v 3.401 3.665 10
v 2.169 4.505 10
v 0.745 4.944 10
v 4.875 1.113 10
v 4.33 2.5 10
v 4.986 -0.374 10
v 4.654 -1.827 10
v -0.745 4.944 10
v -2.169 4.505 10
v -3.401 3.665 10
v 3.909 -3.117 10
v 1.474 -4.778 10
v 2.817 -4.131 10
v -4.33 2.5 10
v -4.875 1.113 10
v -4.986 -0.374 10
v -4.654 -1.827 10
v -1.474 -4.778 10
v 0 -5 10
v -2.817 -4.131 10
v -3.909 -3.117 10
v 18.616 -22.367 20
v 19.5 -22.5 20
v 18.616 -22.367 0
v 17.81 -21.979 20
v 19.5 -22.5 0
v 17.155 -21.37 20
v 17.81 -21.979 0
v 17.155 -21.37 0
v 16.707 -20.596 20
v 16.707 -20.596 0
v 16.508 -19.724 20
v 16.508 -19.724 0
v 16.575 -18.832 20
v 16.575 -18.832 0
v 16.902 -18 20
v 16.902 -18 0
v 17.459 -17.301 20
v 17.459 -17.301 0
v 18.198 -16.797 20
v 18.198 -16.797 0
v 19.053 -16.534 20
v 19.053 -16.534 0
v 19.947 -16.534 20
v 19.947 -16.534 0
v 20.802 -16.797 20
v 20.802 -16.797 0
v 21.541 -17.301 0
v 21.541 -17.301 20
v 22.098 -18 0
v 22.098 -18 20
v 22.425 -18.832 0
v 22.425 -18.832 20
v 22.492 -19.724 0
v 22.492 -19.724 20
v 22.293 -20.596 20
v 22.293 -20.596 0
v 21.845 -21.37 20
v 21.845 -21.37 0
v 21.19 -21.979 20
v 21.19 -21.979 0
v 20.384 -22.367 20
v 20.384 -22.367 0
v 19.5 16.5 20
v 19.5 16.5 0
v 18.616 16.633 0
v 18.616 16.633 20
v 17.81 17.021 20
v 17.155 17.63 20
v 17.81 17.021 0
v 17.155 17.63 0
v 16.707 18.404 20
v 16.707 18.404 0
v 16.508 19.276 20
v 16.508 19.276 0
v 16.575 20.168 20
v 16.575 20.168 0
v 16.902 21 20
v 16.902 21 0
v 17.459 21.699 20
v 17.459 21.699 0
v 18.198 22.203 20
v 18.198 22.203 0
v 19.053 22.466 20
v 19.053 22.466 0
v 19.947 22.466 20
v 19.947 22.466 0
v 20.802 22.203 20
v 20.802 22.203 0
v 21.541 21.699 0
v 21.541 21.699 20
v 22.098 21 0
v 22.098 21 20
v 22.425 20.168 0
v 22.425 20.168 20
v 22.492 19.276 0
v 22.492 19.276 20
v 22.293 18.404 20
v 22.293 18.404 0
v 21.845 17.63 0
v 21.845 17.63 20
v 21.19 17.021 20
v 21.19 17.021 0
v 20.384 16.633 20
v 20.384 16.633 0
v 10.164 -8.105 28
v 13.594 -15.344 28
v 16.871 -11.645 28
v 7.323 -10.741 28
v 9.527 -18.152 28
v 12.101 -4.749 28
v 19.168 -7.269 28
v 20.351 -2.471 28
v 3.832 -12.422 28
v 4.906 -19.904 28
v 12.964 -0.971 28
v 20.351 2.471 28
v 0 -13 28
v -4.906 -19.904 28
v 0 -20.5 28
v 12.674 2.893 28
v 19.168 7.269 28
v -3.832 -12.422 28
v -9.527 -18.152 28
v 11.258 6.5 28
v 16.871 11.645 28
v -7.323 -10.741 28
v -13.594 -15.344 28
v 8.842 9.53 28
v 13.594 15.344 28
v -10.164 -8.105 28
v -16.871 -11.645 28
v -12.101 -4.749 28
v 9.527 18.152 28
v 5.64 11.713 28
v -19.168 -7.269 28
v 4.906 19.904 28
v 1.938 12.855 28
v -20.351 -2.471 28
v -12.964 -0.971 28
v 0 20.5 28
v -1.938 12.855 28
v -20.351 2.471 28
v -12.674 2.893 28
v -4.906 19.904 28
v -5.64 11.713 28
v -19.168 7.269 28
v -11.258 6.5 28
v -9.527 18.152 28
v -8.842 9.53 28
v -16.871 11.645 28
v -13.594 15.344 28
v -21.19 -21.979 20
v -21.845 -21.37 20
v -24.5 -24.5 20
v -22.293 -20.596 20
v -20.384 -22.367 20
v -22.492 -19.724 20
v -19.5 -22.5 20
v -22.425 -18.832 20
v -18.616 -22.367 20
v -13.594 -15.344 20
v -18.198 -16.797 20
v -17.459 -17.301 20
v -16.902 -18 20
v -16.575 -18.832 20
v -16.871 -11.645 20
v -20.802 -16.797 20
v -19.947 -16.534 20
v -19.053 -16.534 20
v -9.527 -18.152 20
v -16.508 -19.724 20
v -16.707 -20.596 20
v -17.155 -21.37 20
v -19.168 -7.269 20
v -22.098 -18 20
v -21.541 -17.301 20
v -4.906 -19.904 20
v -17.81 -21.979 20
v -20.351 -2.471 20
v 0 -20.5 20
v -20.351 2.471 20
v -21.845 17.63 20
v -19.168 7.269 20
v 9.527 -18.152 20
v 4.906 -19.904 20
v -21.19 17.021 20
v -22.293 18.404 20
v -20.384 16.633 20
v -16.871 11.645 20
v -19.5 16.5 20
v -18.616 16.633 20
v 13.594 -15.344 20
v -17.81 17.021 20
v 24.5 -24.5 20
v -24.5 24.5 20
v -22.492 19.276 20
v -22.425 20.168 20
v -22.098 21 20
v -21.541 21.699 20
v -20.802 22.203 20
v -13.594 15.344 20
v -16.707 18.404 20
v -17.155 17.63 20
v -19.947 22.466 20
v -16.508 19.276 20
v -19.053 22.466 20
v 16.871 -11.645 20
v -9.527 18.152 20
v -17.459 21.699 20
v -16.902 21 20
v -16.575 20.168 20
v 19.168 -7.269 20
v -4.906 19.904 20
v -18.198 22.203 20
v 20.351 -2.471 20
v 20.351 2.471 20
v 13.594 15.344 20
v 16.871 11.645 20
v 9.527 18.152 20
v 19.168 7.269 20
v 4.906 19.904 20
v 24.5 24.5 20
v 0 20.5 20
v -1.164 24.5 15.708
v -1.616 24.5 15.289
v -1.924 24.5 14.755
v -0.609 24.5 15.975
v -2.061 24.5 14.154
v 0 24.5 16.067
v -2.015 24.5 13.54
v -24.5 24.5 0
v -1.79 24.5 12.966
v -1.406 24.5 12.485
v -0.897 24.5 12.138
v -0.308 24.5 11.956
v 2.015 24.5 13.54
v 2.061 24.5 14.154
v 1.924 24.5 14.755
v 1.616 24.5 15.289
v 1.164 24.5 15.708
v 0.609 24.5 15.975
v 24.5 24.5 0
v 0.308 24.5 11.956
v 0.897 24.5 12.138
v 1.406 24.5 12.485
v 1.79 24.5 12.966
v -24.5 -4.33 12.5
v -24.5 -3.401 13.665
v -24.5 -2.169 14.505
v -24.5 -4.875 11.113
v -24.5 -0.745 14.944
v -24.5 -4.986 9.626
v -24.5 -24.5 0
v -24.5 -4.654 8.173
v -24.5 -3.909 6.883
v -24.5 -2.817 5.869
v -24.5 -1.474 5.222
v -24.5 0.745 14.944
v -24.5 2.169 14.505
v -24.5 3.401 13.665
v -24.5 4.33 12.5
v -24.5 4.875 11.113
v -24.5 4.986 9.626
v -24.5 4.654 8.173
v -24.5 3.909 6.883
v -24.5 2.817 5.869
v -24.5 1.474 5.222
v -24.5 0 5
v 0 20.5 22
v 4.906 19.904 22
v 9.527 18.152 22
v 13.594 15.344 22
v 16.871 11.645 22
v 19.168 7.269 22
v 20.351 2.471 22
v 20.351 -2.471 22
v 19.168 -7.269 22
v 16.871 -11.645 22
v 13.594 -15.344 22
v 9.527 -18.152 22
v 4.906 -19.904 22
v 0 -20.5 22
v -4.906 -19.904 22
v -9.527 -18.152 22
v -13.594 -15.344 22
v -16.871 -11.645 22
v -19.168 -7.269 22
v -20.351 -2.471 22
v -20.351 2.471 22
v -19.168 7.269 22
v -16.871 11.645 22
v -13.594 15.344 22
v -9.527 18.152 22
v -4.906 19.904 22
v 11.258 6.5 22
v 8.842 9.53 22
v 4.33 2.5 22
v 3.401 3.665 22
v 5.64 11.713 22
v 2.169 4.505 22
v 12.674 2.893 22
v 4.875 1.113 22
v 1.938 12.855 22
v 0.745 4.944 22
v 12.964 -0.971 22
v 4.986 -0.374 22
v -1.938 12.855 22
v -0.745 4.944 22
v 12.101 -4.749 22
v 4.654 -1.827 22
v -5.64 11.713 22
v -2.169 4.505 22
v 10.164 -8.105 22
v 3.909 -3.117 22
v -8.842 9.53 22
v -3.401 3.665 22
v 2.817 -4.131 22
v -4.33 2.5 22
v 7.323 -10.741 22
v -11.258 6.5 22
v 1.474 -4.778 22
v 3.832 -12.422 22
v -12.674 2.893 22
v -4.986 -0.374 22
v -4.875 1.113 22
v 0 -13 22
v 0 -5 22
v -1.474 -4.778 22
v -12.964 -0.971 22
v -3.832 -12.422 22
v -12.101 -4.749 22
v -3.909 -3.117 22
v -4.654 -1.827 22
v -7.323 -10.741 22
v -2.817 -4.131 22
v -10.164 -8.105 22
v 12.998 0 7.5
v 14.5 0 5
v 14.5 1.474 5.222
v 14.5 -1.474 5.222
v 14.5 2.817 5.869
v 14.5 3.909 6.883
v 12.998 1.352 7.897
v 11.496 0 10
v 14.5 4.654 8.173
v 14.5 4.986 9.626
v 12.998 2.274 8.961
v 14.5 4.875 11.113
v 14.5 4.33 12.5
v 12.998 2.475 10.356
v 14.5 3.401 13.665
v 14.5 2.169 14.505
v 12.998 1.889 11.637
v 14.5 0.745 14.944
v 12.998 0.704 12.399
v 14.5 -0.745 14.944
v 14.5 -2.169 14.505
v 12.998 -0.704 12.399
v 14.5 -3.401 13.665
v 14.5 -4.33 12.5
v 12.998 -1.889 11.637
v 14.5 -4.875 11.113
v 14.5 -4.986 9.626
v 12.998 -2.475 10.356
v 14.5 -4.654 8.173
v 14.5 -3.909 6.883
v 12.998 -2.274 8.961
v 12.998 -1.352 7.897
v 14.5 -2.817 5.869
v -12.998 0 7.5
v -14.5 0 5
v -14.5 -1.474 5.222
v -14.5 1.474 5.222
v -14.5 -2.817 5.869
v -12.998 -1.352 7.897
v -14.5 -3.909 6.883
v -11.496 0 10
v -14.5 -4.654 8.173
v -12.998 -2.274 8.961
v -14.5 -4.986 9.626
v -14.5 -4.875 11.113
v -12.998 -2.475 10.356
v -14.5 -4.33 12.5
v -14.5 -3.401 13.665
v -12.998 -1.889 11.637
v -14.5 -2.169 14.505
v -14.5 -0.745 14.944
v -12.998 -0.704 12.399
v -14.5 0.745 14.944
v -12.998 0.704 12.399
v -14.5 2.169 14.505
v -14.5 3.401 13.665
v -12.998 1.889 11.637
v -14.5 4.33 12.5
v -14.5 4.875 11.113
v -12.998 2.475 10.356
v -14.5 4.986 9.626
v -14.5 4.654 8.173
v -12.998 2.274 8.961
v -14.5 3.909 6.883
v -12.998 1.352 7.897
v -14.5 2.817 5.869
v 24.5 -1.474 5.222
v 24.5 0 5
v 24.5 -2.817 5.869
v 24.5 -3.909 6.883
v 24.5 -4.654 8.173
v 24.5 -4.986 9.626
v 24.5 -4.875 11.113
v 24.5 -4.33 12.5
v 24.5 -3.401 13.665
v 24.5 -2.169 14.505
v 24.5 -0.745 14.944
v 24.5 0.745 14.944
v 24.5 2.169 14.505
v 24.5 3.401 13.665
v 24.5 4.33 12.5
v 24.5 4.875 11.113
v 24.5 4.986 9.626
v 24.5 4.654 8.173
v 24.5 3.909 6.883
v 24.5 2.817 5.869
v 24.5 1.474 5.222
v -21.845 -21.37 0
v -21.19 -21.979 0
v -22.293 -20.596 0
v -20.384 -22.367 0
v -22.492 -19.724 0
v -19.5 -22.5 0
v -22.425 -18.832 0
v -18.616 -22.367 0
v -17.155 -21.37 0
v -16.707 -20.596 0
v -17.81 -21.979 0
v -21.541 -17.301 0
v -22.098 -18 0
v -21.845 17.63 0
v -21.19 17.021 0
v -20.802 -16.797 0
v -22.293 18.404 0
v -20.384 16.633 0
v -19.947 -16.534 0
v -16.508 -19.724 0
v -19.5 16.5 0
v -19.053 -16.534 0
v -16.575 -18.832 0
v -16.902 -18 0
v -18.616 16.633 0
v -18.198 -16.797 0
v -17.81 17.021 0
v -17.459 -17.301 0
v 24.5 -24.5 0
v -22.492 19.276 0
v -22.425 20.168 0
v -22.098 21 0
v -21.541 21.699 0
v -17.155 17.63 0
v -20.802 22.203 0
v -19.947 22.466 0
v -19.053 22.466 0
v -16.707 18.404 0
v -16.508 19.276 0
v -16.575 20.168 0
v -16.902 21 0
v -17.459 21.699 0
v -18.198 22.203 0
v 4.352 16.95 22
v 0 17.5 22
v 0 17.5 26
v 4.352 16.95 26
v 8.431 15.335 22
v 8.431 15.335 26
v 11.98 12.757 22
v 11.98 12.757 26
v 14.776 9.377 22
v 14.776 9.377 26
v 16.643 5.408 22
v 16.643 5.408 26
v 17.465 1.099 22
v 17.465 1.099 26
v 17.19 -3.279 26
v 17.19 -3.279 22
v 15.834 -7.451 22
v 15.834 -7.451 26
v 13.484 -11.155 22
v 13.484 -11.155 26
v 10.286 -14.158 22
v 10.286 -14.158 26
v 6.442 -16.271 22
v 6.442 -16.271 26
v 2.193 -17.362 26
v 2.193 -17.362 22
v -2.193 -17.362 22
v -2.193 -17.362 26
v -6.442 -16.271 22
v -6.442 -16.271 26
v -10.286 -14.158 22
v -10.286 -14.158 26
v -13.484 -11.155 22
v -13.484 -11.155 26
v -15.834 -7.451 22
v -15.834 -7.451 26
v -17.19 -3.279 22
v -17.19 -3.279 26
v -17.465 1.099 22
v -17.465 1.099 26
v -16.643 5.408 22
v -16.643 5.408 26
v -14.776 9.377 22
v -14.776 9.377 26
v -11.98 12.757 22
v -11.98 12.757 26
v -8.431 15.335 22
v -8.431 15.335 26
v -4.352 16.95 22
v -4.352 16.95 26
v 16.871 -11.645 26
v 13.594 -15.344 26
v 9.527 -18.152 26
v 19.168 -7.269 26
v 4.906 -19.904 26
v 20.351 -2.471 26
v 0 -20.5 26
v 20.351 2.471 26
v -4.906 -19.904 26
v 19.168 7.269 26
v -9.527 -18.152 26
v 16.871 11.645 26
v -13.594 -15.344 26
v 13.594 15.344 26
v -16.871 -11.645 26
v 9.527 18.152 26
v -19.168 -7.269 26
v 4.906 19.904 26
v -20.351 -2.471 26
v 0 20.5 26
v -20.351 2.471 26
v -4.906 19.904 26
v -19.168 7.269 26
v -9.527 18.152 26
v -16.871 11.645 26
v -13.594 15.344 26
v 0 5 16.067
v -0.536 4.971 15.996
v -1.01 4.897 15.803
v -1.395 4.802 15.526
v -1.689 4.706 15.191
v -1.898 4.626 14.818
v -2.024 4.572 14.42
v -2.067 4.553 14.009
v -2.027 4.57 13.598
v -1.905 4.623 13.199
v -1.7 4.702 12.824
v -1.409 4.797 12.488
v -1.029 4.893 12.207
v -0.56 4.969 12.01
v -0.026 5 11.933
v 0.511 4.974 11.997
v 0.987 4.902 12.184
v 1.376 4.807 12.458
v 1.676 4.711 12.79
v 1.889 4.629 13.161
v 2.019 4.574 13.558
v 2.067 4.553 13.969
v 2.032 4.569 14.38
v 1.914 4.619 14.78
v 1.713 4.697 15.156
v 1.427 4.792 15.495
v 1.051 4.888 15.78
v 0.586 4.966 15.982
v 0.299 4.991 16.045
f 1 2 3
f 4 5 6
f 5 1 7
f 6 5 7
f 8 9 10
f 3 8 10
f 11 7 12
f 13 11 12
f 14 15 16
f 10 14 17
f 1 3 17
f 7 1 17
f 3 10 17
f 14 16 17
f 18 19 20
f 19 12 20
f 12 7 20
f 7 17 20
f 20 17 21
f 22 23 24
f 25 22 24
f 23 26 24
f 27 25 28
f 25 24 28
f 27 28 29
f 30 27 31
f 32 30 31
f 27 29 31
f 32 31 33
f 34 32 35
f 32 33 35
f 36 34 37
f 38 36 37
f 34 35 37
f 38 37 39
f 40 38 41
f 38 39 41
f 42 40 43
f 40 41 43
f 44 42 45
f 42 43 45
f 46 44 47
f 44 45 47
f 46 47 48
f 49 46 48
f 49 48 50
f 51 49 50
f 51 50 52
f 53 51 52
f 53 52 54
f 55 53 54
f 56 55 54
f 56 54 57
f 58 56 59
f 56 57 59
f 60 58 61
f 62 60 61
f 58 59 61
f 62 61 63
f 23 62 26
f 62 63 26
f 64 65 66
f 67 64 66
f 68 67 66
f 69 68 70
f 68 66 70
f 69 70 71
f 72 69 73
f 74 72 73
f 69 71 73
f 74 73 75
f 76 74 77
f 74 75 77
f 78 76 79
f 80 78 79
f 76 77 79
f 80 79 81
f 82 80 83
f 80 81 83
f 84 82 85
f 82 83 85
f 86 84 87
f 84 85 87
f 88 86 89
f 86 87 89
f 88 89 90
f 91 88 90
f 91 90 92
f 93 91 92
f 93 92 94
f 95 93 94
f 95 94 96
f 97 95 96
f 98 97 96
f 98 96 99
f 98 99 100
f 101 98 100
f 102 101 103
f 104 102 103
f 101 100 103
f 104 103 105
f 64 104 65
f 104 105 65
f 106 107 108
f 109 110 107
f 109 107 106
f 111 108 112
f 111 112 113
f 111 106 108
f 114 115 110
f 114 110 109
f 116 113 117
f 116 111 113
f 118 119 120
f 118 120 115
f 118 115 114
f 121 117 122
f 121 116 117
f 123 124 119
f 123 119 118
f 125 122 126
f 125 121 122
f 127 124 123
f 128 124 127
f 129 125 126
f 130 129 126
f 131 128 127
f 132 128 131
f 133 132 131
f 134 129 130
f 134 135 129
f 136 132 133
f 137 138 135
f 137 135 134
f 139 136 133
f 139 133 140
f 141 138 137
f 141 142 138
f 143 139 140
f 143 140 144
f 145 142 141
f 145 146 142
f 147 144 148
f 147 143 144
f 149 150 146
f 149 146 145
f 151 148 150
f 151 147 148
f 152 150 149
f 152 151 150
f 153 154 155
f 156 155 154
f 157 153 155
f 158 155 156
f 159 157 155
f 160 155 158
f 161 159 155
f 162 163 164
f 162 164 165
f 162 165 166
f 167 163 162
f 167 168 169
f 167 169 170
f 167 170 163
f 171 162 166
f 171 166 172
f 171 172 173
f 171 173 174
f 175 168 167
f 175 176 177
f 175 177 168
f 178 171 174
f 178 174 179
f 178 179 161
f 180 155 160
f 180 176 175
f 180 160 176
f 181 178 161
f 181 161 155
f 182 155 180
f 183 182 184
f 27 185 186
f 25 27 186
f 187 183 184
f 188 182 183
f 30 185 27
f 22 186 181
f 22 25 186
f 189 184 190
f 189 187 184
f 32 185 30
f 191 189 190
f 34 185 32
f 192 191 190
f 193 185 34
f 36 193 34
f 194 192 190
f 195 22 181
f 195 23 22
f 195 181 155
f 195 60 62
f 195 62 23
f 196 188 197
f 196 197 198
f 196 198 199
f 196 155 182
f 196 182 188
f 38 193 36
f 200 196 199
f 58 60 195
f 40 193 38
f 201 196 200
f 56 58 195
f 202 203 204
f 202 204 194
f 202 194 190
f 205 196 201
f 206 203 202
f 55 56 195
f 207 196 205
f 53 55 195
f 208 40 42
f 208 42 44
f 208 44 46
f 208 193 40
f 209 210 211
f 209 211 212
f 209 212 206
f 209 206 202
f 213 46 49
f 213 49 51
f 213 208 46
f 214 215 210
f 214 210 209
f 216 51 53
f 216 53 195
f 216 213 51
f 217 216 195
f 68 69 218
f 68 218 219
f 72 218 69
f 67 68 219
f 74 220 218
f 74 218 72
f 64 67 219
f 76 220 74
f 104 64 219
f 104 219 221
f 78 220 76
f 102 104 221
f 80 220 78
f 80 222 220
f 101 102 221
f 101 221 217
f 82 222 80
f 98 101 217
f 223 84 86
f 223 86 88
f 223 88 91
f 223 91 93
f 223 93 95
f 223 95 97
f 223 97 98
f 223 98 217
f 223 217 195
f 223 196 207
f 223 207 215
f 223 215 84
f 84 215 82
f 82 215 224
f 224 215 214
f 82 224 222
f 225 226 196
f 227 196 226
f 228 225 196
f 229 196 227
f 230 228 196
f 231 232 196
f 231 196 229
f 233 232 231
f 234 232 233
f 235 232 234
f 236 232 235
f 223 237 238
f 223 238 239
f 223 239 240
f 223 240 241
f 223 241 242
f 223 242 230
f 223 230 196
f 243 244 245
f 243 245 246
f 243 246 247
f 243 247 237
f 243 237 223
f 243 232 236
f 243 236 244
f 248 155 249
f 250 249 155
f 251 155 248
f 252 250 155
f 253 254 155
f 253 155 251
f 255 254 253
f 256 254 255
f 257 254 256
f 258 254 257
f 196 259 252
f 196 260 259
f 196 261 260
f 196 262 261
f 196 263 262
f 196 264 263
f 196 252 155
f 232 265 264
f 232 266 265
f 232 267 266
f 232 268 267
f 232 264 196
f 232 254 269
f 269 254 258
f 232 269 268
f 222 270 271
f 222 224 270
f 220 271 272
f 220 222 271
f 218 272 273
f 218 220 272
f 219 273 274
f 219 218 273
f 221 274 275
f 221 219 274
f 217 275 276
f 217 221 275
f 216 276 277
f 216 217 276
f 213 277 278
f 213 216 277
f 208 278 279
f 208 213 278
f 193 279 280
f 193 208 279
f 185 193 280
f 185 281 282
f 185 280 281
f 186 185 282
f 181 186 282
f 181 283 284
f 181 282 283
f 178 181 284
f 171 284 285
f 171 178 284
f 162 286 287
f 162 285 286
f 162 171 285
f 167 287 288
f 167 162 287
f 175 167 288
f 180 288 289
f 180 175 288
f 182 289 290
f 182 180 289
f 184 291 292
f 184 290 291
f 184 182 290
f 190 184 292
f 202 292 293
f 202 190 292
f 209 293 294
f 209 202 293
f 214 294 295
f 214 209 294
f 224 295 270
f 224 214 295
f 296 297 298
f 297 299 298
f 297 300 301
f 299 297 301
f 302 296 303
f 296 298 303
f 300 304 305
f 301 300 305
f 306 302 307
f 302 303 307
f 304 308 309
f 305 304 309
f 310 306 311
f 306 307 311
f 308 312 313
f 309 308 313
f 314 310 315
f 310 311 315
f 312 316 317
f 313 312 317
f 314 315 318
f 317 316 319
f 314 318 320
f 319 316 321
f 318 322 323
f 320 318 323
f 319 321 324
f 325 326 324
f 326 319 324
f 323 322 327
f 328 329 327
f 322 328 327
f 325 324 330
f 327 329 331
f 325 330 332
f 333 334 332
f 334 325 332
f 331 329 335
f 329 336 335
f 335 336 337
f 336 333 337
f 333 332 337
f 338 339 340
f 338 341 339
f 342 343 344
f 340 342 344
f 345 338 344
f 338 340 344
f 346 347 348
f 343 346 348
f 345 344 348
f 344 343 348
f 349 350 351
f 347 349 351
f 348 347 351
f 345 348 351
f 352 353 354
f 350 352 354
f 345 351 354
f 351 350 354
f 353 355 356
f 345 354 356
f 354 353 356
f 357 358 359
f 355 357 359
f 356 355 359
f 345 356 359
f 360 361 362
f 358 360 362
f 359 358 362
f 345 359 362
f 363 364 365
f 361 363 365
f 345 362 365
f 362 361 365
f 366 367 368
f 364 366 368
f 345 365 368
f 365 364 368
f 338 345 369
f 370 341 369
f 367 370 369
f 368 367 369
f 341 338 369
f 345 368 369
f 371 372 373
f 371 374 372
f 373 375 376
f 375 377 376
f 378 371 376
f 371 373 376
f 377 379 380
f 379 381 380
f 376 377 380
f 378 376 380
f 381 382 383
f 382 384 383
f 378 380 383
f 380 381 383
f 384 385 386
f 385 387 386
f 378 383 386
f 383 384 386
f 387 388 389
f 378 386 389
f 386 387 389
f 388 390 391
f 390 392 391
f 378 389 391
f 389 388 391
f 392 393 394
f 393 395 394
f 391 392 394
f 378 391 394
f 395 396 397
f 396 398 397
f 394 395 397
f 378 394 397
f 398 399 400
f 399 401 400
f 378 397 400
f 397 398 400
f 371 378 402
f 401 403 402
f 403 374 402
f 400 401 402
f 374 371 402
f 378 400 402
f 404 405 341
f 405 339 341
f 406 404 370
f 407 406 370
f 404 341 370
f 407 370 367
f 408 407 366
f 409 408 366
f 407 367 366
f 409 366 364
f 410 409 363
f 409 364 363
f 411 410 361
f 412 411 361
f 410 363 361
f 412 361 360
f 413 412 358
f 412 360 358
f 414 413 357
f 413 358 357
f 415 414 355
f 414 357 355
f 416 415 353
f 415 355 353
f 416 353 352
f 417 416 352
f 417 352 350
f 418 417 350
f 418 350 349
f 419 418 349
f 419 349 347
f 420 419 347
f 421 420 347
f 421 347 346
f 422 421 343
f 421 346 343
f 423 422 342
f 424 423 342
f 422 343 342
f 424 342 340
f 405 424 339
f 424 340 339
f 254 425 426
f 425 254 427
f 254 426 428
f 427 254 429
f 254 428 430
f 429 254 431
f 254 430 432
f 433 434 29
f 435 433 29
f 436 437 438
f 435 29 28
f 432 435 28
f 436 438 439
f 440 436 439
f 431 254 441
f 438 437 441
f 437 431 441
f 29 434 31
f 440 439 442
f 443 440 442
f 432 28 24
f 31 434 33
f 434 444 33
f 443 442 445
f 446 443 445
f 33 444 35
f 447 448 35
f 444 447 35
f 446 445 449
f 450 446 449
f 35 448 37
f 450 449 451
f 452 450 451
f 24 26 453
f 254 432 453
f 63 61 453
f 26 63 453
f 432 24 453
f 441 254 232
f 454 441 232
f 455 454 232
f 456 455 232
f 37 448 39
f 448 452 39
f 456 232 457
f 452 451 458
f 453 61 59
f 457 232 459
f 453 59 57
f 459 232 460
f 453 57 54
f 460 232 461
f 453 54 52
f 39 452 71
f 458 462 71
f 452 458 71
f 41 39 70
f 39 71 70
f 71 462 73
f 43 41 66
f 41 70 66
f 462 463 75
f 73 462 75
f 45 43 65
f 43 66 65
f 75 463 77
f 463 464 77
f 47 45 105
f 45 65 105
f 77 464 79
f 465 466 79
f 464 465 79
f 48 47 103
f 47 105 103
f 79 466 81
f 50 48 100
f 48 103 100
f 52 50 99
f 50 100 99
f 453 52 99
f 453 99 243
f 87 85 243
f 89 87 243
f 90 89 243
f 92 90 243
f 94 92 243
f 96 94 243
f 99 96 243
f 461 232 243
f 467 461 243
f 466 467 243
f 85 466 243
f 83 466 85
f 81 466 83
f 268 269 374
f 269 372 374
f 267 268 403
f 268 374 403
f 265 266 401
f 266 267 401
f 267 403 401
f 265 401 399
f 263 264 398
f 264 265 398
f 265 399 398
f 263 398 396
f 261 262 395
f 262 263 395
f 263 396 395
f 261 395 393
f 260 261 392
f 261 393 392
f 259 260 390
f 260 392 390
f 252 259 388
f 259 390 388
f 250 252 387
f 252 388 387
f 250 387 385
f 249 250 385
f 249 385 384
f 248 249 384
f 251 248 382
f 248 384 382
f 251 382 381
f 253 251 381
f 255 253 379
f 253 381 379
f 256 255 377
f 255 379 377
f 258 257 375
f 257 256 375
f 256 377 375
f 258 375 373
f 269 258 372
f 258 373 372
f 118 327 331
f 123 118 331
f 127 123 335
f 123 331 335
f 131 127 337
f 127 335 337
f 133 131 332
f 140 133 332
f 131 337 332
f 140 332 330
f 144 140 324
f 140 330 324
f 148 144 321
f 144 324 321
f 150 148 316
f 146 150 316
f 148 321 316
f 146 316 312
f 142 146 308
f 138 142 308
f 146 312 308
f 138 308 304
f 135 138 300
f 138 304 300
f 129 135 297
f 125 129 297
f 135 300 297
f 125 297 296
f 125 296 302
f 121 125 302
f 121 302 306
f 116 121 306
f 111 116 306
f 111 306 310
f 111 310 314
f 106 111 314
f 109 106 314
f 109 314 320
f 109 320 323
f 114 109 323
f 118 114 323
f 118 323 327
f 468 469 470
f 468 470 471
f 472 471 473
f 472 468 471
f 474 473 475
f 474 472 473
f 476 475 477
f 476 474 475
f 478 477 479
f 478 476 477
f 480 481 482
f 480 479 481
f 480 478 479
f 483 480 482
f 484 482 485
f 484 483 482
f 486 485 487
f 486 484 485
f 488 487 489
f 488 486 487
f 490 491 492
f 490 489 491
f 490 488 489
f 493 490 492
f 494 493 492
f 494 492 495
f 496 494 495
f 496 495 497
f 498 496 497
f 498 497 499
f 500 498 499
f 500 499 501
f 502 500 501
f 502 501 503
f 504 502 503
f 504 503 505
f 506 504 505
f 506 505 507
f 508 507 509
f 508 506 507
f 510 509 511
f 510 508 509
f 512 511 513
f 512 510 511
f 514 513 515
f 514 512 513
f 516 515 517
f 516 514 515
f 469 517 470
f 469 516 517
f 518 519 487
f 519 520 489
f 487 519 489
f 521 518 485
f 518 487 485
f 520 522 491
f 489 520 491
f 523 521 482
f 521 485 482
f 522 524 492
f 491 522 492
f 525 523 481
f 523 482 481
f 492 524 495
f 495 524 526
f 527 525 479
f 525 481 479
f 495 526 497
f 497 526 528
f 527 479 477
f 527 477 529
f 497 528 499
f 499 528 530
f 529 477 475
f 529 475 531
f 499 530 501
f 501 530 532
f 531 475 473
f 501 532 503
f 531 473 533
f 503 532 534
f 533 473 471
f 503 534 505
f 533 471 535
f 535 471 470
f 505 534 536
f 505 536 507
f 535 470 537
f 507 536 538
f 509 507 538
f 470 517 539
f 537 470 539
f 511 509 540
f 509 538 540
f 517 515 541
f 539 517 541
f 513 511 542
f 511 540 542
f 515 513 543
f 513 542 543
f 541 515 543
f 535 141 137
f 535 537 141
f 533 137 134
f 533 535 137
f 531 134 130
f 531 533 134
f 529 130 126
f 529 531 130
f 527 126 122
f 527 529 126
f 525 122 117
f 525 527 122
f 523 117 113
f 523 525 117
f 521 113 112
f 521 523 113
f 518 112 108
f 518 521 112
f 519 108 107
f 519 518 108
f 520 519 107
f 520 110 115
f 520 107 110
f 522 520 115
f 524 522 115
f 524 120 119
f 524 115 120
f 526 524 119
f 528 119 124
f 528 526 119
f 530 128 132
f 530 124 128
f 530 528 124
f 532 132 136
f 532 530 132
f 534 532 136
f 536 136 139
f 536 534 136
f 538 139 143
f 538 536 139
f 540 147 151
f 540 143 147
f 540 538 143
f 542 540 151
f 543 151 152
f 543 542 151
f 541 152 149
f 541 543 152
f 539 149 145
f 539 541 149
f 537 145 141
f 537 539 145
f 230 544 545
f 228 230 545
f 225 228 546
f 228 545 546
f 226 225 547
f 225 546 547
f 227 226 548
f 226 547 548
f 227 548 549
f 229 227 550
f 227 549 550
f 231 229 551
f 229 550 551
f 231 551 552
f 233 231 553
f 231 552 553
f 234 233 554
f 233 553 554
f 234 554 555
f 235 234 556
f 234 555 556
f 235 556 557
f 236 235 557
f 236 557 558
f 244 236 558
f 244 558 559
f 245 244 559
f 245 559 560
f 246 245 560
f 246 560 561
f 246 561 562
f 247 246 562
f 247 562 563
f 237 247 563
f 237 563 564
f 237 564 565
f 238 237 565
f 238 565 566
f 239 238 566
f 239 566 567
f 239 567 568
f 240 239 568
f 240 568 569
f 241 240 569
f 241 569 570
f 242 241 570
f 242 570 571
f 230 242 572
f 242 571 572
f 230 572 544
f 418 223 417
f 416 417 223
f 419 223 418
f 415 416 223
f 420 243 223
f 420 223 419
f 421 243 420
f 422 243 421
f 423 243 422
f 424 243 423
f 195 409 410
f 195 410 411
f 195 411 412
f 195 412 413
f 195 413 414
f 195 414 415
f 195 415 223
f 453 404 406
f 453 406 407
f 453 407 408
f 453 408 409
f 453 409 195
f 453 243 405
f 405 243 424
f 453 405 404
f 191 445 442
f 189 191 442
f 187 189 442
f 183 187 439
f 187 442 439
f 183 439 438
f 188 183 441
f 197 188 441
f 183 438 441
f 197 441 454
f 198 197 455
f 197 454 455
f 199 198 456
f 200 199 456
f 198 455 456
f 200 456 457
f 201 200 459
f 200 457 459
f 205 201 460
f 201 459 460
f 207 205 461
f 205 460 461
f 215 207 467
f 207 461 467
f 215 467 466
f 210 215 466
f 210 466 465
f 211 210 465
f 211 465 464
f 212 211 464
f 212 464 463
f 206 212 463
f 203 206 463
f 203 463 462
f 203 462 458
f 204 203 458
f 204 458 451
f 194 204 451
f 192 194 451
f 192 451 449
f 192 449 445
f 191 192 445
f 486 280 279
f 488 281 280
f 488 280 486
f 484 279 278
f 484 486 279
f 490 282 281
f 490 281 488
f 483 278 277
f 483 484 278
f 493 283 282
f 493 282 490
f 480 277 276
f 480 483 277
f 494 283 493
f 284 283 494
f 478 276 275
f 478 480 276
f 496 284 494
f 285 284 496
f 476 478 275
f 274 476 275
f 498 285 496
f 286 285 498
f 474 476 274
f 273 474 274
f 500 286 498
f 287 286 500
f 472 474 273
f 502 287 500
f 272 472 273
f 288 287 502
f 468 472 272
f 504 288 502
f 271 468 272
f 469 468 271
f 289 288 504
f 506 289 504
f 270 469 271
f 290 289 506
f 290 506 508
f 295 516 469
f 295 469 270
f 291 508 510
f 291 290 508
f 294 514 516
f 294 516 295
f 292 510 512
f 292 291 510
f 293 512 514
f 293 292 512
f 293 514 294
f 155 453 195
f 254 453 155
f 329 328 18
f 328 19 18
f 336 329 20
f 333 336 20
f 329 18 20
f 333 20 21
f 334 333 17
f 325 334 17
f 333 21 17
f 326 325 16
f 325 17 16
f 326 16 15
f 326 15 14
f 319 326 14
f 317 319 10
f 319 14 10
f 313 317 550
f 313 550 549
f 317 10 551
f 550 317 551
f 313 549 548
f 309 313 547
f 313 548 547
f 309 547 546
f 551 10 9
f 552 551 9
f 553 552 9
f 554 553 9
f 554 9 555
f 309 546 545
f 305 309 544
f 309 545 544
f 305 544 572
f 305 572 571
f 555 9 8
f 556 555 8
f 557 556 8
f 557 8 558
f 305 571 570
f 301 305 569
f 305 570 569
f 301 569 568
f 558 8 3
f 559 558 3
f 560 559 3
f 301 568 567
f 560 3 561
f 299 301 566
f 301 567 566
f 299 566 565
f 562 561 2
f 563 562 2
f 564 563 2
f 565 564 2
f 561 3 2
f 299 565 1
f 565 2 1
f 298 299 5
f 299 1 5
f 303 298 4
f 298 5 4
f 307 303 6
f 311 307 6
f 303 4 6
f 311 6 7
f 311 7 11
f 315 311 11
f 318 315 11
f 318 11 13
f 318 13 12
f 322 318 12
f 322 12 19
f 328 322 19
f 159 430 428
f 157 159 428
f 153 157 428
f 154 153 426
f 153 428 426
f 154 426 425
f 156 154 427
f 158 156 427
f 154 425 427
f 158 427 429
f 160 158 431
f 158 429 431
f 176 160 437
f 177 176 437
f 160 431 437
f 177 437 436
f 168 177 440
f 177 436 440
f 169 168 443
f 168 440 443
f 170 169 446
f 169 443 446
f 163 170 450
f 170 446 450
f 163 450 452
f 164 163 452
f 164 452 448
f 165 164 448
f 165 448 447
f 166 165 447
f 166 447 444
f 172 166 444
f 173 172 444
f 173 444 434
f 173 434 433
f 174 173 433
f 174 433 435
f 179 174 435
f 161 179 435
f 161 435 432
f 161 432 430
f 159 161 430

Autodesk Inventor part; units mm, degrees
ref_plane "XZ Plane" through (0, 0, 0) normal (0, 1, 0) x (-1, 0, 0)
ref_plane "XY Plane" through (0, 0, 0) normal (0, 0, 1) x (1, 0, 0)
sketch "Sketch1" plane through (0, 0, 0) normal (0, 0, 1) x (1, 0, 0)
  line L0 (-24.5, 24.5) -> (24.5, 24.5)
  line L1 (24.5, 24.5) -> (24.5, -24.5)
  line L2 (24.5, -24.5) -> (-24.5, -24.5)
  line L3 (-24.5, -24.5) -> (-24.5, 24.5)
  point P0 (0, 0)
  point P1 (-24.5, 0)
  point P2 (0, 24.5)
  dimension "Width" = 49
  dimension "Height" = 49
extrude "Extrusion1" add sketch "Sketch1" along normal blind 20
sketch "Sketch2" plane through (0, 0, 20) normal (0, 0, 1) x (1, 0, 0)
  line L0 (24.5, 24.5) -> (24.5, -24.5) projected
  line L1 (-24.5, 24.5) -> (24.5, 24.5) projected
  line L2 (-24.5, -24.5) -> (-24.5, 24.5) projected
  line L3 (24.5, -24.5) -> (-24.5, -24.5) projected
  line L4 (19.5, 19.5) -> (19.5, -19.5)
  line L5 (19.5, -19.5) -> (-19.5, -19.5)
  line L6 (-19.5, -19.5) -> (-19.5, 19.5)
  line L7 (-19.5, 19.5) -> (19.5, 19.5)
  point P0 (0, 0)
  dimension "d4" = 5
  dimension "d5" = 39
  dimension "d6" = 39
hole "Hole1" at (-19.5, -19.5, 20) direction (0, 0, -1) diameter 6 end through all
pattern_linear "Rectangular Pattern1" count 2 spacing 39 along (1, 0, 0) count 2 spacing 39 along (0, 1, 0) of "Hole1"
sketch "Sketch3" plane through (0, 0, 0) normal (1, 0, 0) x (0, 1, 0)
  line L0 (-24.5, 20) -> (24.5, 20) projected
  line L1 (0, 20) -> (0, 28)
  line L2 (0, 28) -> (20.5, 28)
  line L3 (20.5, 28) -> (20.5, 26)
  line L4 (20.5, 26) -> (17.5, 26)
  line L5 (17.5, 26) -> (17.5, 22)
  line L6 (17.5, 22) -> (20.5, 22)
  line L7 (20.5, 22) -> (20.5, 20)
  point P0 (0, 0)
  dimension "d25" = 8
  dimension "d26" = 20.5
  dimension "d27" = 2
  dimension "d28" = 4
  dimension "d29" = 17.5
revolve "Revolution1" add sketch "Sketch3" angle 360 about axis through (0, 0, 20) along (0, 0, 1)
sketch "Sketch4" plane through (-24.5, 24.5, 0) normal (0, 1, 0) x (1, 0, 0)
  line L0 (0, -20) -> (49, -20) projected
  line L1 (0, 0) -> (0, -20) projected
  line L2 (24.5, -20) -> (24.5, -14)
  point P0 (24.5, 0)
  dimension "d32" = 6
hole "Hole2" at (0, 0, 28) direction (0, 0, -1) diameter 10 depth 18 counterbore diameter 26 counterbore depth 6
hole "Hole3" at (0, 24.5, 14) direction (0, -1, 0) diameter 4.134 end up to surface thread size "M5x0.8" class "6H" standard "ANSI Metric M Profile"
sketch "Sketch6" plane through (24.5, -24.5, 0) normal (1, 0, 0) x (0, 0, -1)
  line L0 (0, 49) -> (0, 0) projected
  line L1 (0, 49) -> (-20, 49) projected
  point P0 (0, 24.5)
  point P1 (-10, 24.5)
  point P2 (0, 24.5)
  point P3 (-10, 49)
hole "Hole4" at (24.5, 0, 10) direction (-1, 0, 0) diameter 10 depth 10 tip angle 118
mirror "Mirror1" about plane through (0, 0, 0) normal (1, 0, 0) of "Hole4"
equation "\"Height\" = Width"
equation "\"d16\" = d5"
equation "\"d19\" = d6"
properties part number "TU-001" material "Steel, Mild"
